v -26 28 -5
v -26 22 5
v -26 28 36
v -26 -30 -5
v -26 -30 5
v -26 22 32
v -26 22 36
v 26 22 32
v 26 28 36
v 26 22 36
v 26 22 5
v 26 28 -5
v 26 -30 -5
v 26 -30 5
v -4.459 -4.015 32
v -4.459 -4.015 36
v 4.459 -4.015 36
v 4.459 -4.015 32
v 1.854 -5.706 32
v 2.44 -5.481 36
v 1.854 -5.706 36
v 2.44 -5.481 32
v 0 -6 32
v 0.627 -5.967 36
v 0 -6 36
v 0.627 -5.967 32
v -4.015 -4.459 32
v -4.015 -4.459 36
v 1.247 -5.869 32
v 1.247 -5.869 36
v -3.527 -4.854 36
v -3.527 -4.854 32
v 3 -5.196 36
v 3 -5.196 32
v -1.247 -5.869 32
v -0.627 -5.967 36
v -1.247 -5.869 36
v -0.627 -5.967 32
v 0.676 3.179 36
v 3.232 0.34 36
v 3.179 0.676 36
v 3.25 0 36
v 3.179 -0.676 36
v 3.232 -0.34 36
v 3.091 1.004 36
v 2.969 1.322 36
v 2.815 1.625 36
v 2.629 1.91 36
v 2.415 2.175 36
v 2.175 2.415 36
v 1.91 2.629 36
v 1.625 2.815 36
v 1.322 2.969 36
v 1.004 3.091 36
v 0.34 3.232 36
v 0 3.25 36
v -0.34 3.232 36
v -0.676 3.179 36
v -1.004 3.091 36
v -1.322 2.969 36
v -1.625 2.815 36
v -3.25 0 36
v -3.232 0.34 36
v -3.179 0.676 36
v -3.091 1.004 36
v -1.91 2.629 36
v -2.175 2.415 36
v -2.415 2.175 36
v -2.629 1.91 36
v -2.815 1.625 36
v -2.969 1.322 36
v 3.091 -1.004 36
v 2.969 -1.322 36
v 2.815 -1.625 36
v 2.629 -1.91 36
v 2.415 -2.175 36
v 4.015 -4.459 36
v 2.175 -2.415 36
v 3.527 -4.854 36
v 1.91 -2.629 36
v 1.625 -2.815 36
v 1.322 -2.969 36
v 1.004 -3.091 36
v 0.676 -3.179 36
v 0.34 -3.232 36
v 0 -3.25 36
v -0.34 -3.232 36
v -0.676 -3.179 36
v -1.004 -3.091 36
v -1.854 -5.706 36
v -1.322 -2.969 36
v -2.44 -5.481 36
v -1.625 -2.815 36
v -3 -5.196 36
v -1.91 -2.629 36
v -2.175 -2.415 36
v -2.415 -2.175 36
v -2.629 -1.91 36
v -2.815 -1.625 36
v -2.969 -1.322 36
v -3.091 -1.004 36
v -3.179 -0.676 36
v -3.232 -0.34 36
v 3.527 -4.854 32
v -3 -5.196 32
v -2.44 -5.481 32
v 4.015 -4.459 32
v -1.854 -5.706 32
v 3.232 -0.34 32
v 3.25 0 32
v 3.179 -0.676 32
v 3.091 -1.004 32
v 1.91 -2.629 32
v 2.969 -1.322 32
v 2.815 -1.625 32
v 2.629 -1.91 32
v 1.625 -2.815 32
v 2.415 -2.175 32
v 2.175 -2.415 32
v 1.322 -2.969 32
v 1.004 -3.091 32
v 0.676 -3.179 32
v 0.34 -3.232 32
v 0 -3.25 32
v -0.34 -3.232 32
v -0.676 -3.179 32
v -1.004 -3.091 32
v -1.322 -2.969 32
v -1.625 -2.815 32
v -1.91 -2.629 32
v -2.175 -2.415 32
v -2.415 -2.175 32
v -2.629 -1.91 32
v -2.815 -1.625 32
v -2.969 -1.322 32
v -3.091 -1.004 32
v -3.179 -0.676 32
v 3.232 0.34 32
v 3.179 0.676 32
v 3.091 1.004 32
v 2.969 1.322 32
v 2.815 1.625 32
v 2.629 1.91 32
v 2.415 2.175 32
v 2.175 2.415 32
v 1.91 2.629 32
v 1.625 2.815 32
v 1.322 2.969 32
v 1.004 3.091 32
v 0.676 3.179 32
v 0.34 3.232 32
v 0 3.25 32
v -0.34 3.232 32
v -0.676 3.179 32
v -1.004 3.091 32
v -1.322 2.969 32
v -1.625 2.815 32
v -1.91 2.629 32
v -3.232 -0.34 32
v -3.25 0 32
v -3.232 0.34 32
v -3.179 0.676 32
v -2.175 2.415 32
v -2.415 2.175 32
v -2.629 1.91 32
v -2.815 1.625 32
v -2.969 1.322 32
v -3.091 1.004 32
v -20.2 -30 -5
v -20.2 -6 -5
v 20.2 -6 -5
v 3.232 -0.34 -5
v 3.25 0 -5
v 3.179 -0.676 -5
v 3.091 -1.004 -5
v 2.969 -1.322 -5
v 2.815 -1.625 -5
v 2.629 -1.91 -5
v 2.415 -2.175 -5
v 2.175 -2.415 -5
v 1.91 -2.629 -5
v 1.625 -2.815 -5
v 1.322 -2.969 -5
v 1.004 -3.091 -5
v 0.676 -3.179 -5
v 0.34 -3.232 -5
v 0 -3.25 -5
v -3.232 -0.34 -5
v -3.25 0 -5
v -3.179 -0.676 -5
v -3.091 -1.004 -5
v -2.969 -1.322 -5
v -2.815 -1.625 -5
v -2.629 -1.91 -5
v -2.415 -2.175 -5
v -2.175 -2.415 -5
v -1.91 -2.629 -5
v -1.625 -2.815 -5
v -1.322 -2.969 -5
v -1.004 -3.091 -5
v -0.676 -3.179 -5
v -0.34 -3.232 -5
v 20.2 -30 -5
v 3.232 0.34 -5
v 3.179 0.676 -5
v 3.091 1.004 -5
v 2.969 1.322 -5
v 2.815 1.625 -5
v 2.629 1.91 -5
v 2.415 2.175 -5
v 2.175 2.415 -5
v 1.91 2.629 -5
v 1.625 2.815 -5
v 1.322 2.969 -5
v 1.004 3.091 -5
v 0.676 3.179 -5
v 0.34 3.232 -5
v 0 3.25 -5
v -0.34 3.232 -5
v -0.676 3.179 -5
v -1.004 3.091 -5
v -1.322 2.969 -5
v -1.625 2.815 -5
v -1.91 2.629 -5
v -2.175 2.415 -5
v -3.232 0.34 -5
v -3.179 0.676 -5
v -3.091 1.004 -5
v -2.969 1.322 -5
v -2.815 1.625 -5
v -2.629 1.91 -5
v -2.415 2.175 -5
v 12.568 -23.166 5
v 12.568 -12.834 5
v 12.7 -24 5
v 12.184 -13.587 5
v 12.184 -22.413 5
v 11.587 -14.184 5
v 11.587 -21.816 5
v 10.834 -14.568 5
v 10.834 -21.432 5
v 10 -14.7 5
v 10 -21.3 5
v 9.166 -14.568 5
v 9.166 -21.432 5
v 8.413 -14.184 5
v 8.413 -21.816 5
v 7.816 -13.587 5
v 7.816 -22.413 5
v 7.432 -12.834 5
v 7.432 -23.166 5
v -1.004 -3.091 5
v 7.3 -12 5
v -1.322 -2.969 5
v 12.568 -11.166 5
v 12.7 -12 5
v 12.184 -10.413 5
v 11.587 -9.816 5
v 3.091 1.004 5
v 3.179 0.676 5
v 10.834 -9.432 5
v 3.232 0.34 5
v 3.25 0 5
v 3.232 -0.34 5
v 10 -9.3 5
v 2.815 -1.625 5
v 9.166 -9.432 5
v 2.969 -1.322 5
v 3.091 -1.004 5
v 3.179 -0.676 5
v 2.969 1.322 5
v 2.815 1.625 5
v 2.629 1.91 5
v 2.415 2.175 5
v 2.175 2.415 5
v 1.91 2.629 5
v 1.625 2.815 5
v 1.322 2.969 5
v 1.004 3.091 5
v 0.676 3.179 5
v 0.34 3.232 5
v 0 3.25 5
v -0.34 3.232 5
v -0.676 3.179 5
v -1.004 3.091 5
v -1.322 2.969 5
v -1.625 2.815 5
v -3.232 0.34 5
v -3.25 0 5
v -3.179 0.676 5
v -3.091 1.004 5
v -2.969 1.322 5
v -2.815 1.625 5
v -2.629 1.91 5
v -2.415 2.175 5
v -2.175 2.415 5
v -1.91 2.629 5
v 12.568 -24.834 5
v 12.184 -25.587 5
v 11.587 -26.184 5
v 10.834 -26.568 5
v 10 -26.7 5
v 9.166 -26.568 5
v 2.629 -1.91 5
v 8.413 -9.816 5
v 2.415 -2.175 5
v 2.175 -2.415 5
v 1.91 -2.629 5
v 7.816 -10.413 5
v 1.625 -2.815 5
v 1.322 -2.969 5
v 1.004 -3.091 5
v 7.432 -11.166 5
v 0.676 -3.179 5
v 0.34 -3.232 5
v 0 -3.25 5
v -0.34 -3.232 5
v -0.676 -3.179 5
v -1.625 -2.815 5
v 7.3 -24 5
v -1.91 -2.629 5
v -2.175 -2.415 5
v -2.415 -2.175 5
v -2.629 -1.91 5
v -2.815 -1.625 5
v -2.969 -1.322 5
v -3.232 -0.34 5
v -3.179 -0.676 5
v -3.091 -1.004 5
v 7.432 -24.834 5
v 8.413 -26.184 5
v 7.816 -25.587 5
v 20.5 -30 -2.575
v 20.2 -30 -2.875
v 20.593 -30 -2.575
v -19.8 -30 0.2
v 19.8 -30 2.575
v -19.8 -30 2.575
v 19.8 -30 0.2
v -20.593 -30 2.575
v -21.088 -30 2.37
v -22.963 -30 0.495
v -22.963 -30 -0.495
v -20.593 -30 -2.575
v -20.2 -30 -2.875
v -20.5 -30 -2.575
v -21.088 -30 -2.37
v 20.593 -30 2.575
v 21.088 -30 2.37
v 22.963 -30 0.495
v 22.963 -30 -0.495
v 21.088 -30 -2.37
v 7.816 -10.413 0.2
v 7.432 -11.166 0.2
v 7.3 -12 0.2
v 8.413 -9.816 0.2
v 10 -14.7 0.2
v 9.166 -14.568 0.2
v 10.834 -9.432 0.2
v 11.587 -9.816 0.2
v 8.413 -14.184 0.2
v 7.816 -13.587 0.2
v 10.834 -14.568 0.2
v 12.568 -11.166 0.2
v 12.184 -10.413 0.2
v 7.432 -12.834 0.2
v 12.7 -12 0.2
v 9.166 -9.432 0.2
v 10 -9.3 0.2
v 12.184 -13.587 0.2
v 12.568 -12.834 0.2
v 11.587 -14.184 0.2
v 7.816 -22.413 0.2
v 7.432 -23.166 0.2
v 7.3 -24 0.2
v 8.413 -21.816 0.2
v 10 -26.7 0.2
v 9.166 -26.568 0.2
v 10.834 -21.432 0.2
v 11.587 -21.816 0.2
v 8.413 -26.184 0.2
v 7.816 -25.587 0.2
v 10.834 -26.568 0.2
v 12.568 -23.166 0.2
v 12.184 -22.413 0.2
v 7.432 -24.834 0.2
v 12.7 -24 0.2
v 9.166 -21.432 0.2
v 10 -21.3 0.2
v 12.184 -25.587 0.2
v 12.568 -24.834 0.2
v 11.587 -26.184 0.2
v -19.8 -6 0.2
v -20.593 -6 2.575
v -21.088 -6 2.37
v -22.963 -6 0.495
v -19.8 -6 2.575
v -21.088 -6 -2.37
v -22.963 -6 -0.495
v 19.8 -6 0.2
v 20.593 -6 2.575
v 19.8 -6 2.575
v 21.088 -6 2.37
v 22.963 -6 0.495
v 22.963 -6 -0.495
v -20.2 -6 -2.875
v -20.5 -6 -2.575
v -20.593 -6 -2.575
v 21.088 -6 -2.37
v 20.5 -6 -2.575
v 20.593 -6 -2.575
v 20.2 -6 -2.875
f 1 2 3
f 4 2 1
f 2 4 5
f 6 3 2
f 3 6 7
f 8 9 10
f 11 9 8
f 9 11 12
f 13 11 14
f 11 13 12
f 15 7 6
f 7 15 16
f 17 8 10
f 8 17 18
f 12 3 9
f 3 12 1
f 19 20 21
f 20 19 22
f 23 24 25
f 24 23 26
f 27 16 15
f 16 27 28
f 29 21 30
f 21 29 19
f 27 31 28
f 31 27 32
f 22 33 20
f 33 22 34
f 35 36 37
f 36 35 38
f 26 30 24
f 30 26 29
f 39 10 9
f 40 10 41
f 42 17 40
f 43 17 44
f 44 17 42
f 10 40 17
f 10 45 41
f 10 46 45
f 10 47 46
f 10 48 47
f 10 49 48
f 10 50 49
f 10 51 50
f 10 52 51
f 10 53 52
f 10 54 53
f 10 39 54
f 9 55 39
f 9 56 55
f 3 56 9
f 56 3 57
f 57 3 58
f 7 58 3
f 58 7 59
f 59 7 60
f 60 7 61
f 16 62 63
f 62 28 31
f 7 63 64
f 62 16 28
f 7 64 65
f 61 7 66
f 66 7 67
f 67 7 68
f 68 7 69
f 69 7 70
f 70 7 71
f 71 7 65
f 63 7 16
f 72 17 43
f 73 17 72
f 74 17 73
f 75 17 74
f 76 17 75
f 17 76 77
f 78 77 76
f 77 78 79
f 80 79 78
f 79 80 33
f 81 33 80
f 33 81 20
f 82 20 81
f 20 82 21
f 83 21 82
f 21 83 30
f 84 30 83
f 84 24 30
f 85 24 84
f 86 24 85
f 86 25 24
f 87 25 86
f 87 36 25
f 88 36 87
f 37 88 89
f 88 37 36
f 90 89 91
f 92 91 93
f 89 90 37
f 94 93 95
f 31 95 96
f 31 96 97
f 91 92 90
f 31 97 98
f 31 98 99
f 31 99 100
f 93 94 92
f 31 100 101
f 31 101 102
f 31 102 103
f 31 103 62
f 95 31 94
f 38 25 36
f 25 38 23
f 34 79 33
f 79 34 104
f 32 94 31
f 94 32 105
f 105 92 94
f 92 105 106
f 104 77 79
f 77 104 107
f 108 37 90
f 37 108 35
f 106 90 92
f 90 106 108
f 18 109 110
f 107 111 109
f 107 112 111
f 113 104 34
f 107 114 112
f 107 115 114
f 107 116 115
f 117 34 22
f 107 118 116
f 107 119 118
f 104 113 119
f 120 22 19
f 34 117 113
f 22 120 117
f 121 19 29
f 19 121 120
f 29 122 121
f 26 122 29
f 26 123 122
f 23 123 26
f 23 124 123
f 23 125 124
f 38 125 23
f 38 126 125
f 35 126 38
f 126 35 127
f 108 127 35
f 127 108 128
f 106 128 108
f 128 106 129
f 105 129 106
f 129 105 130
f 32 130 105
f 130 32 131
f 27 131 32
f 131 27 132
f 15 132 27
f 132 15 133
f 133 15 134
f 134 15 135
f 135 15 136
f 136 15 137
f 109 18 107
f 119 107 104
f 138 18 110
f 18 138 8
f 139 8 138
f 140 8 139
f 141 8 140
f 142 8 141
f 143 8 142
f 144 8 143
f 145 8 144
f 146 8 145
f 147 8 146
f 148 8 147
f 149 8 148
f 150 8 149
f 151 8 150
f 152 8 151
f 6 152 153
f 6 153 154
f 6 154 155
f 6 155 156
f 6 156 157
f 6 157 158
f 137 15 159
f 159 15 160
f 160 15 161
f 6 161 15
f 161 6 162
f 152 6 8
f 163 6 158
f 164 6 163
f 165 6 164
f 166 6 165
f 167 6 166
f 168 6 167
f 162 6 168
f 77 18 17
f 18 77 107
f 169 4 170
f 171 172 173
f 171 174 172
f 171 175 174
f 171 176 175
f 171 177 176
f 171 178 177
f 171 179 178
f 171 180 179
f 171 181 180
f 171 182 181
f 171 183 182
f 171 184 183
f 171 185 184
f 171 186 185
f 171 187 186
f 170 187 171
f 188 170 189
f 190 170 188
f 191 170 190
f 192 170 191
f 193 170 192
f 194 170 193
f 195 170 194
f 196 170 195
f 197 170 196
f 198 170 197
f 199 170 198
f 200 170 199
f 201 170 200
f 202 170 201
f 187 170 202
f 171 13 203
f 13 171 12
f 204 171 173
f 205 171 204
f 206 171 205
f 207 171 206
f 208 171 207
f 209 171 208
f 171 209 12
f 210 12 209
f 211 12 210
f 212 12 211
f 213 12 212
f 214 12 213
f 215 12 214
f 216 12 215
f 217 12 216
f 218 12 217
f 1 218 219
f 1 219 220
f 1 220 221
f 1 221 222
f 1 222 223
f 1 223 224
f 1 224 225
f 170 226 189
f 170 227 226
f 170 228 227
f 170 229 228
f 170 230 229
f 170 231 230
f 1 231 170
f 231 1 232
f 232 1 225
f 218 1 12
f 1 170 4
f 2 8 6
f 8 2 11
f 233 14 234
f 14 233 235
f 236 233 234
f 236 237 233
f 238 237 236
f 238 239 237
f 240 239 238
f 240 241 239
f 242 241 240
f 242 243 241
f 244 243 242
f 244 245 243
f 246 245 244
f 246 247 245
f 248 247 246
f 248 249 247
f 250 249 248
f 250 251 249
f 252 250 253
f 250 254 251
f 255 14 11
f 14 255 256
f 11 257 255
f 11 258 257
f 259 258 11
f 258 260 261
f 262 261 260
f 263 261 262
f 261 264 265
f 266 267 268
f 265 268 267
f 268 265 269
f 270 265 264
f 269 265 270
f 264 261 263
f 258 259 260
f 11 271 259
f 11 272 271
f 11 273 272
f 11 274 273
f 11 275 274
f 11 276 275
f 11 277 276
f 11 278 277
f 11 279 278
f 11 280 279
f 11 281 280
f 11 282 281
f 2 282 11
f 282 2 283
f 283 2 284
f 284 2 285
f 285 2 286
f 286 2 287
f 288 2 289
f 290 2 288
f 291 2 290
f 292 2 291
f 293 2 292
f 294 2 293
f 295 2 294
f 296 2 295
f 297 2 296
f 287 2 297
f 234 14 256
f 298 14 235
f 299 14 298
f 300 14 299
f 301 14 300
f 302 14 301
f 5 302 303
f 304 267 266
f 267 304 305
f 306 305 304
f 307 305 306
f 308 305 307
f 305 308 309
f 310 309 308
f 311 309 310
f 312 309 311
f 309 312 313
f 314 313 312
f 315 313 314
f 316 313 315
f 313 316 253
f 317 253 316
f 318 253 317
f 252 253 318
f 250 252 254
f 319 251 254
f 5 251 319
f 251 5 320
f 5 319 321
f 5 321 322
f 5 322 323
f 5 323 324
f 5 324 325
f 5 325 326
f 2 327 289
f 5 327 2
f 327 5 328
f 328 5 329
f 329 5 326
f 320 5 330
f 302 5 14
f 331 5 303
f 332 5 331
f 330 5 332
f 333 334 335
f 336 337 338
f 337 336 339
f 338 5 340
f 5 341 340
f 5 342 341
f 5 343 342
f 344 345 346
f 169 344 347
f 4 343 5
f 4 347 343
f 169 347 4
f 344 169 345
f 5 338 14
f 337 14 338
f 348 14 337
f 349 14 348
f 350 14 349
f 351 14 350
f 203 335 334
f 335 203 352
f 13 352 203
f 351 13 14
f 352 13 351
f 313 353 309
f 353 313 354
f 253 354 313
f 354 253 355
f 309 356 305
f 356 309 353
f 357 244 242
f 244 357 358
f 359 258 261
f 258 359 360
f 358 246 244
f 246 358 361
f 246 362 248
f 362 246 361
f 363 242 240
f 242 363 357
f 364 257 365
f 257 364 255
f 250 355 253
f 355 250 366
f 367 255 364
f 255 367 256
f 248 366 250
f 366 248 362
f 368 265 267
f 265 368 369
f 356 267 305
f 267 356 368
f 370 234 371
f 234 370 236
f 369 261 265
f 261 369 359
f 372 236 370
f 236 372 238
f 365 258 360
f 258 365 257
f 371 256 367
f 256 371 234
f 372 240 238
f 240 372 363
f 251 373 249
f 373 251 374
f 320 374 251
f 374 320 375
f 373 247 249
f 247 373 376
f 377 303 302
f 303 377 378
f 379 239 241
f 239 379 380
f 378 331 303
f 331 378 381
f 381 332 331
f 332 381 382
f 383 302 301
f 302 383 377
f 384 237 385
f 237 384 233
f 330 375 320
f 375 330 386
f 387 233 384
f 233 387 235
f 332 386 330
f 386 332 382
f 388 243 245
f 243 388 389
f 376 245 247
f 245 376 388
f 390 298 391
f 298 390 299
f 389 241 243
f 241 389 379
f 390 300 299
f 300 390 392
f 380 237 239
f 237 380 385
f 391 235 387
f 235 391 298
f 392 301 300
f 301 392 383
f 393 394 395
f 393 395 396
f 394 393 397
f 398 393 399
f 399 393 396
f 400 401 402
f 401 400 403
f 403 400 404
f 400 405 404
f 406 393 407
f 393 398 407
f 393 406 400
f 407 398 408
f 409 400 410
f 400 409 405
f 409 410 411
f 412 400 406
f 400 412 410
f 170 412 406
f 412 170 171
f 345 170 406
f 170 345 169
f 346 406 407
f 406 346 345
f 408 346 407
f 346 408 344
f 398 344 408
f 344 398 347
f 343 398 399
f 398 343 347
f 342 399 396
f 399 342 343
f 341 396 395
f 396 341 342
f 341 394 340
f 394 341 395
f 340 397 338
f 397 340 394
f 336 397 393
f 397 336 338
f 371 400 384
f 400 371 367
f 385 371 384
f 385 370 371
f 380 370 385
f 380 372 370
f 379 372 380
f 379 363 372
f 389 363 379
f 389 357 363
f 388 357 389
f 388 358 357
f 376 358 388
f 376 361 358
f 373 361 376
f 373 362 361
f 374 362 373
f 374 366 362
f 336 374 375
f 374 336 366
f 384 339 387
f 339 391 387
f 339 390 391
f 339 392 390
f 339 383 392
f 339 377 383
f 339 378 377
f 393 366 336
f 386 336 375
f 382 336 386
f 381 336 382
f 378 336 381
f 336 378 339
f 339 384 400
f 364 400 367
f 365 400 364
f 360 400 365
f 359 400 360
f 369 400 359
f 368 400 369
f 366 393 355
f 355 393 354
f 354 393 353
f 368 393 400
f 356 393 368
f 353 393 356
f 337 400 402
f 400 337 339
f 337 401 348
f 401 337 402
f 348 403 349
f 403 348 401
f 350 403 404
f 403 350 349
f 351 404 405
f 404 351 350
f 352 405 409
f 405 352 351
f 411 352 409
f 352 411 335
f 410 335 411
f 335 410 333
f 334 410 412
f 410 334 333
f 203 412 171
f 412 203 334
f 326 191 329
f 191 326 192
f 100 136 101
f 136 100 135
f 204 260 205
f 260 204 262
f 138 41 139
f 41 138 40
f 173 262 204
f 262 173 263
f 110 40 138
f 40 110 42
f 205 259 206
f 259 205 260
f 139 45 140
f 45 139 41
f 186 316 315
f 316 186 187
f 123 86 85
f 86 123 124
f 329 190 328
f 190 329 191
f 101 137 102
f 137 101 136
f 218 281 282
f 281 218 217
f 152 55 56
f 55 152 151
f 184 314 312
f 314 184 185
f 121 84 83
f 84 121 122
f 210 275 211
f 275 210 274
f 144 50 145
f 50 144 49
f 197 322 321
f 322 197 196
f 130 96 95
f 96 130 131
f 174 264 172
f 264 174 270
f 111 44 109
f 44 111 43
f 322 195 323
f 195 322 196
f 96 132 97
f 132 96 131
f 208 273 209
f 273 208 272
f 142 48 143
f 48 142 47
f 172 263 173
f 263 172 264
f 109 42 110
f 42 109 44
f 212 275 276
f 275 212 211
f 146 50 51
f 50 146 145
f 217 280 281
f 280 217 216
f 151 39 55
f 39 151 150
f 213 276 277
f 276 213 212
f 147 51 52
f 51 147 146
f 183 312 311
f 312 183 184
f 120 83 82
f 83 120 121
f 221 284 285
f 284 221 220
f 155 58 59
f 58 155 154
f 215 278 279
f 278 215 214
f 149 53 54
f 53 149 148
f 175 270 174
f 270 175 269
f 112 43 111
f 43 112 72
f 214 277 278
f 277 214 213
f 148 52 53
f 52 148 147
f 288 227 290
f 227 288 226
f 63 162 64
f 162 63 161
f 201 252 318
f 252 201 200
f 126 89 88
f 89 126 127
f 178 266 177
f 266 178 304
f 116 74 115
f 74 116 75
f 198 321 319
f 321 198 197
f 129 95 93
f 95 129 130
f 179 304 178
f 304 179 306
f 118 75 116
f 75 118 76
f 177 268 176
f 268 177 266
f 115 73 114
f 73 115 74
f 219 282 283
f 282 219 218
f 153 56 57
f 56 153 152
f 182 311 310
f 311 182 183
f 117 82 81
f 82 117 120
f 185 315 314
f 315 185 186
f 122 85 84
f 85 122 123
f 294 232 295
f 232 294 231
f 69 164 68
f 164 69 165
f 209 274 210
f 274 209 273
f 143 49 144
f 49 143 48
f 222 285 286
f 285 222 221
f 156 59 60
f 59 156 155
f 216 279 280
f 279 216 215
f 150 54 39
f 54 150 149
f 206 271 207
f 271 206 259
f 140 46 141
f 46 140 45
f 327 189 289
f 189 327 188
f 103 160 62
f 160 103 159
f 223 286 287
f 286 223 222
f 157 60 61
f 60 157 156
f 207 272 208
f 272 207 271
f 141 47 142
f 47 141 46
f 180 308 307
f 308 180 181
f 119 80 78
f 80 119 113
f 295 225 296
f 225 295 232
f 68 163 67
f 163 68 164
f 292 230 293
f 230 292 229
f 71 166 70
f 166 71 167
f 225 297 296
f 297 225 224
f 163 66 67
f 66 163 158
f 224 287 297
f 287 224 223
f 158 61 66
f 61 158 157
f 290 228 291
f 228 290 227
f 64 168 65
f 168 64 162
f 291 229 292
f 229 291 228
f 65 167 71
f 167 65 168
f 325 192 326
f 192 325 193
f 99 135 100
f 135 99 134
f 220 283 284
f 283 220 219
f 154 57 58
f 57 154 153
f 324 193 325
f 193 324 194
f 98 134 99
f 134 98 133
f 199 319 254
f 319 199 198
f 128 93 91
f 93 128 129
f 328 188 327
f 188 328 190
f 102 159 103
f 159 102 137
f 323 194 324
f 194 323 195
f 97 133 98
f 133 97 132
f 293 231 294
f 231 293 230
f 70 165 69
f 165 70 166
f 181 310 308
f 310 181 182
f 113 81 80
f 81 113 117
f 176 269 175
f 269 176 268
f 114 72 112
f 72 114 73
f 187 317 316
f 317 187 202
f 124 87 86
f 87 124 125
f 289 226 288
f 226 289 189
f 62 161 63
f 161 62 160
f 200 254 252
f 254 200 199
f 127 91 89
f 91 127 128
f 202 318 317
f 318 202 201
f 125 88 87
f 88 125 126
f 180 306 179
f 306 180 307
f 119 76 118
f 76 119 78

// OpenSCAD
// file: nema23_stepper.scad
// Motor measurements:
// * exterior dimensions (all +/- 1mm?)
// ** 56.4 mm tall
// ** 56.4 mm wide
// ** 41 mm deep
// * extruded disc on shaft side: 1.6mm deep, 38.1+/-0.03 diameter
// * shaft:
// ** 6.35mm diameter
// ** 20.6mm long
// * holes:
// ** 5mm diameter
// ** 47.1mm apart

// aligned with center of face at origin, shaft pointing
// in the +Y direction

overlap = 0.05;
kerf = 0.03;

$fa = 6;
$fn=100;
body = [56.4,41,56.4];
disc_dia = 38.1;
disc_depth = 1.6;
shaft_dia = 6.35;
shaft_len = 20.6;
hole_dia = 5;
hole_distance = 47.1;

module nema23_stepper() {
    i = hole_distance / sqrt(2);
    difference() {
	union() {
	    // body block
	    translate([0,-body[1]/2,0]) cube(size=body,center=true);
	    // extruded disc
	    translate([0,-overlap,0]) rotate([-90,0,0])
	    cylinder(d=disc_dia,h=disc_depth+overlap);
	    // shaft
	    translate([0,-overlap,0]) rotate([-90,0,0])
	    cylinder(d=shaft_dia,h=shaft_len+overlap);
	}
	// subtract mounting holes
	for (a = [45,135,225,315]) {
	    rotate([0,a,0])
	    translate([i,overlap/2,0]) rotate([90,0,0]) cylinder(d=hole_dia,h=body[1]+overlap);
	}
    }
}

module nema23_mount() {
    i = hole_distance / sqrt(2);
    hole_len = 20;
    union() {
	// body block
	translate([0,-body[1]/2,0])
	cube(size=[body[0]+kerf,body[1]+kerf,body[2]+kerf],center=true);
	// extruded disc
	translate([0,-overlap,0]) rotate([-90,0,0])
	cylinder(d=disc_dia+kerf,h=disc_depth+overlap);
	// shaft
	translate([0,-overlap,0]) rotate([-90,0,0])
	cylinder(d=shaft_dia+kerf+1,h=shaft_len+overlap);
	// add mounting shafts
	for (a = [45,135,225,315]) {
	    rotate([0,a,0])
	    translate([i,overlap/2+hole_len,0])
	    rotate([90,0,0])
	    cylinder(d=hole_dia+kerf,h=body[1]+hole_len);
	}
    }    
}

// Render
nema23_stepper();

//color([0.85,0.3,0.3]) nema23_mount();
// main file
use <nema23_stepper.scad>;

module extrusion() {
    rotate([90,0,0])
    linear_extrude(height=100,slices=1)
    import(file="makerslide_profile.dxf",layer="clearance",scale=1);
}

$fn=60;

module screw_hole() {
    d_screw_head = 9.8;
    d_screw_bore = 5.4;
    cylinder(h=100,d=d_screw_bore,$fn=20,center=true);
    translate([0,0,10]) cylinder(h=20,d=d_screw_head,center=true);
}

module motor_bracket() {
    difference() {
	union() {
	    hull() {
		translate([0,28,12.5]) cube(size=[56,60,5],center=true);
		translate([0,-10,-4.5]) cube(size=[50,14,20],center=true);
	    }
	    translate([0,-16,-4.5]) cube(size=[50,36,20.1],center=true);
	    //translate([0,16,0])
	    //translate([0,3.5+overlap,0]) 
	}
	translate([0,30,10]) {
	    rotate([90,0,0]) nema23_mount();
	    cylinder(h=12,d=39);
	}
	//rotate([90,0,0]) cylinder(d=25,h=80,center=true);
	//translate([0,0,50]) cube(size=[25,80,100],center=true);
	for (y = [10,30]) {
	    translate([0,0,5.1])
	    translate([-10,-y,0])
	    screw_hole(); //cylinder(d=5,h=100,center=true);
	}
	for (r=[-90,90]) translate([0,-20,-10]) rotate([0,r,0]) translate([0,0,25]) screw_hole();
	extrusion();
    }
}


module pulley_bracket() {
    shaftw = 26;
    topth = 4;
    ht = shaftw+topth+10;
    bore_dia = 6.5;
    outer_dia = 38;
    pulley_y = 0;
    difference() {
    
	union() {
	    hull() {
		translate([0,25,(shaftw+10)-2])
		cube(size=[52,6,topth],center=true);
		
		translate([0,pulley_y,(shaftw+10)-2])
		cylinder(d=12,h=topth,center=true);
		//translate([0,-10,-4.5]) cube(size=[50,14,20],center=true);
	    }
	    translate([0,25,ht/2-5]) cube(size=[52,6,ht],center=true);
	    translate([0,-1, 0]) cube(size=[52,58,10],center=true);
	    //translate([0,16,0])
	    //translate([0,3.5+overlap,0]) 
	}
	translate([0,pulley_y,0])
	cylinder(d=bore_dia,h=100,center=true);
	//rotate([90,0,0]) cylinder(d=25,h=80,center=true);
	//translate([0,0,50]) cube(size=[25,80,100],center=true);
	//for (r=[-90,90]) translate([0,-20,-10]) rotate([0,r,0]) translate([0,0,25]) screw_hole();
	mirror([1,0,0]) {
	    for (y = [12,24]) {
		translate([0,0,5.1])
		translate([-10,-y,0])
		screw_hole(); //cylinder(d=5,h=100,center=true);
	    }
	    translate([0,-6,0]) extrusion();
	}
    }
}

bore_dia = 6.35;

module pulley_shaft() {
    rotate([90,0,0])
    cylinder(d=bore_dia+0.05,h=90,center=true);
}


pulley_bracket();
//translate([0,10,0])
